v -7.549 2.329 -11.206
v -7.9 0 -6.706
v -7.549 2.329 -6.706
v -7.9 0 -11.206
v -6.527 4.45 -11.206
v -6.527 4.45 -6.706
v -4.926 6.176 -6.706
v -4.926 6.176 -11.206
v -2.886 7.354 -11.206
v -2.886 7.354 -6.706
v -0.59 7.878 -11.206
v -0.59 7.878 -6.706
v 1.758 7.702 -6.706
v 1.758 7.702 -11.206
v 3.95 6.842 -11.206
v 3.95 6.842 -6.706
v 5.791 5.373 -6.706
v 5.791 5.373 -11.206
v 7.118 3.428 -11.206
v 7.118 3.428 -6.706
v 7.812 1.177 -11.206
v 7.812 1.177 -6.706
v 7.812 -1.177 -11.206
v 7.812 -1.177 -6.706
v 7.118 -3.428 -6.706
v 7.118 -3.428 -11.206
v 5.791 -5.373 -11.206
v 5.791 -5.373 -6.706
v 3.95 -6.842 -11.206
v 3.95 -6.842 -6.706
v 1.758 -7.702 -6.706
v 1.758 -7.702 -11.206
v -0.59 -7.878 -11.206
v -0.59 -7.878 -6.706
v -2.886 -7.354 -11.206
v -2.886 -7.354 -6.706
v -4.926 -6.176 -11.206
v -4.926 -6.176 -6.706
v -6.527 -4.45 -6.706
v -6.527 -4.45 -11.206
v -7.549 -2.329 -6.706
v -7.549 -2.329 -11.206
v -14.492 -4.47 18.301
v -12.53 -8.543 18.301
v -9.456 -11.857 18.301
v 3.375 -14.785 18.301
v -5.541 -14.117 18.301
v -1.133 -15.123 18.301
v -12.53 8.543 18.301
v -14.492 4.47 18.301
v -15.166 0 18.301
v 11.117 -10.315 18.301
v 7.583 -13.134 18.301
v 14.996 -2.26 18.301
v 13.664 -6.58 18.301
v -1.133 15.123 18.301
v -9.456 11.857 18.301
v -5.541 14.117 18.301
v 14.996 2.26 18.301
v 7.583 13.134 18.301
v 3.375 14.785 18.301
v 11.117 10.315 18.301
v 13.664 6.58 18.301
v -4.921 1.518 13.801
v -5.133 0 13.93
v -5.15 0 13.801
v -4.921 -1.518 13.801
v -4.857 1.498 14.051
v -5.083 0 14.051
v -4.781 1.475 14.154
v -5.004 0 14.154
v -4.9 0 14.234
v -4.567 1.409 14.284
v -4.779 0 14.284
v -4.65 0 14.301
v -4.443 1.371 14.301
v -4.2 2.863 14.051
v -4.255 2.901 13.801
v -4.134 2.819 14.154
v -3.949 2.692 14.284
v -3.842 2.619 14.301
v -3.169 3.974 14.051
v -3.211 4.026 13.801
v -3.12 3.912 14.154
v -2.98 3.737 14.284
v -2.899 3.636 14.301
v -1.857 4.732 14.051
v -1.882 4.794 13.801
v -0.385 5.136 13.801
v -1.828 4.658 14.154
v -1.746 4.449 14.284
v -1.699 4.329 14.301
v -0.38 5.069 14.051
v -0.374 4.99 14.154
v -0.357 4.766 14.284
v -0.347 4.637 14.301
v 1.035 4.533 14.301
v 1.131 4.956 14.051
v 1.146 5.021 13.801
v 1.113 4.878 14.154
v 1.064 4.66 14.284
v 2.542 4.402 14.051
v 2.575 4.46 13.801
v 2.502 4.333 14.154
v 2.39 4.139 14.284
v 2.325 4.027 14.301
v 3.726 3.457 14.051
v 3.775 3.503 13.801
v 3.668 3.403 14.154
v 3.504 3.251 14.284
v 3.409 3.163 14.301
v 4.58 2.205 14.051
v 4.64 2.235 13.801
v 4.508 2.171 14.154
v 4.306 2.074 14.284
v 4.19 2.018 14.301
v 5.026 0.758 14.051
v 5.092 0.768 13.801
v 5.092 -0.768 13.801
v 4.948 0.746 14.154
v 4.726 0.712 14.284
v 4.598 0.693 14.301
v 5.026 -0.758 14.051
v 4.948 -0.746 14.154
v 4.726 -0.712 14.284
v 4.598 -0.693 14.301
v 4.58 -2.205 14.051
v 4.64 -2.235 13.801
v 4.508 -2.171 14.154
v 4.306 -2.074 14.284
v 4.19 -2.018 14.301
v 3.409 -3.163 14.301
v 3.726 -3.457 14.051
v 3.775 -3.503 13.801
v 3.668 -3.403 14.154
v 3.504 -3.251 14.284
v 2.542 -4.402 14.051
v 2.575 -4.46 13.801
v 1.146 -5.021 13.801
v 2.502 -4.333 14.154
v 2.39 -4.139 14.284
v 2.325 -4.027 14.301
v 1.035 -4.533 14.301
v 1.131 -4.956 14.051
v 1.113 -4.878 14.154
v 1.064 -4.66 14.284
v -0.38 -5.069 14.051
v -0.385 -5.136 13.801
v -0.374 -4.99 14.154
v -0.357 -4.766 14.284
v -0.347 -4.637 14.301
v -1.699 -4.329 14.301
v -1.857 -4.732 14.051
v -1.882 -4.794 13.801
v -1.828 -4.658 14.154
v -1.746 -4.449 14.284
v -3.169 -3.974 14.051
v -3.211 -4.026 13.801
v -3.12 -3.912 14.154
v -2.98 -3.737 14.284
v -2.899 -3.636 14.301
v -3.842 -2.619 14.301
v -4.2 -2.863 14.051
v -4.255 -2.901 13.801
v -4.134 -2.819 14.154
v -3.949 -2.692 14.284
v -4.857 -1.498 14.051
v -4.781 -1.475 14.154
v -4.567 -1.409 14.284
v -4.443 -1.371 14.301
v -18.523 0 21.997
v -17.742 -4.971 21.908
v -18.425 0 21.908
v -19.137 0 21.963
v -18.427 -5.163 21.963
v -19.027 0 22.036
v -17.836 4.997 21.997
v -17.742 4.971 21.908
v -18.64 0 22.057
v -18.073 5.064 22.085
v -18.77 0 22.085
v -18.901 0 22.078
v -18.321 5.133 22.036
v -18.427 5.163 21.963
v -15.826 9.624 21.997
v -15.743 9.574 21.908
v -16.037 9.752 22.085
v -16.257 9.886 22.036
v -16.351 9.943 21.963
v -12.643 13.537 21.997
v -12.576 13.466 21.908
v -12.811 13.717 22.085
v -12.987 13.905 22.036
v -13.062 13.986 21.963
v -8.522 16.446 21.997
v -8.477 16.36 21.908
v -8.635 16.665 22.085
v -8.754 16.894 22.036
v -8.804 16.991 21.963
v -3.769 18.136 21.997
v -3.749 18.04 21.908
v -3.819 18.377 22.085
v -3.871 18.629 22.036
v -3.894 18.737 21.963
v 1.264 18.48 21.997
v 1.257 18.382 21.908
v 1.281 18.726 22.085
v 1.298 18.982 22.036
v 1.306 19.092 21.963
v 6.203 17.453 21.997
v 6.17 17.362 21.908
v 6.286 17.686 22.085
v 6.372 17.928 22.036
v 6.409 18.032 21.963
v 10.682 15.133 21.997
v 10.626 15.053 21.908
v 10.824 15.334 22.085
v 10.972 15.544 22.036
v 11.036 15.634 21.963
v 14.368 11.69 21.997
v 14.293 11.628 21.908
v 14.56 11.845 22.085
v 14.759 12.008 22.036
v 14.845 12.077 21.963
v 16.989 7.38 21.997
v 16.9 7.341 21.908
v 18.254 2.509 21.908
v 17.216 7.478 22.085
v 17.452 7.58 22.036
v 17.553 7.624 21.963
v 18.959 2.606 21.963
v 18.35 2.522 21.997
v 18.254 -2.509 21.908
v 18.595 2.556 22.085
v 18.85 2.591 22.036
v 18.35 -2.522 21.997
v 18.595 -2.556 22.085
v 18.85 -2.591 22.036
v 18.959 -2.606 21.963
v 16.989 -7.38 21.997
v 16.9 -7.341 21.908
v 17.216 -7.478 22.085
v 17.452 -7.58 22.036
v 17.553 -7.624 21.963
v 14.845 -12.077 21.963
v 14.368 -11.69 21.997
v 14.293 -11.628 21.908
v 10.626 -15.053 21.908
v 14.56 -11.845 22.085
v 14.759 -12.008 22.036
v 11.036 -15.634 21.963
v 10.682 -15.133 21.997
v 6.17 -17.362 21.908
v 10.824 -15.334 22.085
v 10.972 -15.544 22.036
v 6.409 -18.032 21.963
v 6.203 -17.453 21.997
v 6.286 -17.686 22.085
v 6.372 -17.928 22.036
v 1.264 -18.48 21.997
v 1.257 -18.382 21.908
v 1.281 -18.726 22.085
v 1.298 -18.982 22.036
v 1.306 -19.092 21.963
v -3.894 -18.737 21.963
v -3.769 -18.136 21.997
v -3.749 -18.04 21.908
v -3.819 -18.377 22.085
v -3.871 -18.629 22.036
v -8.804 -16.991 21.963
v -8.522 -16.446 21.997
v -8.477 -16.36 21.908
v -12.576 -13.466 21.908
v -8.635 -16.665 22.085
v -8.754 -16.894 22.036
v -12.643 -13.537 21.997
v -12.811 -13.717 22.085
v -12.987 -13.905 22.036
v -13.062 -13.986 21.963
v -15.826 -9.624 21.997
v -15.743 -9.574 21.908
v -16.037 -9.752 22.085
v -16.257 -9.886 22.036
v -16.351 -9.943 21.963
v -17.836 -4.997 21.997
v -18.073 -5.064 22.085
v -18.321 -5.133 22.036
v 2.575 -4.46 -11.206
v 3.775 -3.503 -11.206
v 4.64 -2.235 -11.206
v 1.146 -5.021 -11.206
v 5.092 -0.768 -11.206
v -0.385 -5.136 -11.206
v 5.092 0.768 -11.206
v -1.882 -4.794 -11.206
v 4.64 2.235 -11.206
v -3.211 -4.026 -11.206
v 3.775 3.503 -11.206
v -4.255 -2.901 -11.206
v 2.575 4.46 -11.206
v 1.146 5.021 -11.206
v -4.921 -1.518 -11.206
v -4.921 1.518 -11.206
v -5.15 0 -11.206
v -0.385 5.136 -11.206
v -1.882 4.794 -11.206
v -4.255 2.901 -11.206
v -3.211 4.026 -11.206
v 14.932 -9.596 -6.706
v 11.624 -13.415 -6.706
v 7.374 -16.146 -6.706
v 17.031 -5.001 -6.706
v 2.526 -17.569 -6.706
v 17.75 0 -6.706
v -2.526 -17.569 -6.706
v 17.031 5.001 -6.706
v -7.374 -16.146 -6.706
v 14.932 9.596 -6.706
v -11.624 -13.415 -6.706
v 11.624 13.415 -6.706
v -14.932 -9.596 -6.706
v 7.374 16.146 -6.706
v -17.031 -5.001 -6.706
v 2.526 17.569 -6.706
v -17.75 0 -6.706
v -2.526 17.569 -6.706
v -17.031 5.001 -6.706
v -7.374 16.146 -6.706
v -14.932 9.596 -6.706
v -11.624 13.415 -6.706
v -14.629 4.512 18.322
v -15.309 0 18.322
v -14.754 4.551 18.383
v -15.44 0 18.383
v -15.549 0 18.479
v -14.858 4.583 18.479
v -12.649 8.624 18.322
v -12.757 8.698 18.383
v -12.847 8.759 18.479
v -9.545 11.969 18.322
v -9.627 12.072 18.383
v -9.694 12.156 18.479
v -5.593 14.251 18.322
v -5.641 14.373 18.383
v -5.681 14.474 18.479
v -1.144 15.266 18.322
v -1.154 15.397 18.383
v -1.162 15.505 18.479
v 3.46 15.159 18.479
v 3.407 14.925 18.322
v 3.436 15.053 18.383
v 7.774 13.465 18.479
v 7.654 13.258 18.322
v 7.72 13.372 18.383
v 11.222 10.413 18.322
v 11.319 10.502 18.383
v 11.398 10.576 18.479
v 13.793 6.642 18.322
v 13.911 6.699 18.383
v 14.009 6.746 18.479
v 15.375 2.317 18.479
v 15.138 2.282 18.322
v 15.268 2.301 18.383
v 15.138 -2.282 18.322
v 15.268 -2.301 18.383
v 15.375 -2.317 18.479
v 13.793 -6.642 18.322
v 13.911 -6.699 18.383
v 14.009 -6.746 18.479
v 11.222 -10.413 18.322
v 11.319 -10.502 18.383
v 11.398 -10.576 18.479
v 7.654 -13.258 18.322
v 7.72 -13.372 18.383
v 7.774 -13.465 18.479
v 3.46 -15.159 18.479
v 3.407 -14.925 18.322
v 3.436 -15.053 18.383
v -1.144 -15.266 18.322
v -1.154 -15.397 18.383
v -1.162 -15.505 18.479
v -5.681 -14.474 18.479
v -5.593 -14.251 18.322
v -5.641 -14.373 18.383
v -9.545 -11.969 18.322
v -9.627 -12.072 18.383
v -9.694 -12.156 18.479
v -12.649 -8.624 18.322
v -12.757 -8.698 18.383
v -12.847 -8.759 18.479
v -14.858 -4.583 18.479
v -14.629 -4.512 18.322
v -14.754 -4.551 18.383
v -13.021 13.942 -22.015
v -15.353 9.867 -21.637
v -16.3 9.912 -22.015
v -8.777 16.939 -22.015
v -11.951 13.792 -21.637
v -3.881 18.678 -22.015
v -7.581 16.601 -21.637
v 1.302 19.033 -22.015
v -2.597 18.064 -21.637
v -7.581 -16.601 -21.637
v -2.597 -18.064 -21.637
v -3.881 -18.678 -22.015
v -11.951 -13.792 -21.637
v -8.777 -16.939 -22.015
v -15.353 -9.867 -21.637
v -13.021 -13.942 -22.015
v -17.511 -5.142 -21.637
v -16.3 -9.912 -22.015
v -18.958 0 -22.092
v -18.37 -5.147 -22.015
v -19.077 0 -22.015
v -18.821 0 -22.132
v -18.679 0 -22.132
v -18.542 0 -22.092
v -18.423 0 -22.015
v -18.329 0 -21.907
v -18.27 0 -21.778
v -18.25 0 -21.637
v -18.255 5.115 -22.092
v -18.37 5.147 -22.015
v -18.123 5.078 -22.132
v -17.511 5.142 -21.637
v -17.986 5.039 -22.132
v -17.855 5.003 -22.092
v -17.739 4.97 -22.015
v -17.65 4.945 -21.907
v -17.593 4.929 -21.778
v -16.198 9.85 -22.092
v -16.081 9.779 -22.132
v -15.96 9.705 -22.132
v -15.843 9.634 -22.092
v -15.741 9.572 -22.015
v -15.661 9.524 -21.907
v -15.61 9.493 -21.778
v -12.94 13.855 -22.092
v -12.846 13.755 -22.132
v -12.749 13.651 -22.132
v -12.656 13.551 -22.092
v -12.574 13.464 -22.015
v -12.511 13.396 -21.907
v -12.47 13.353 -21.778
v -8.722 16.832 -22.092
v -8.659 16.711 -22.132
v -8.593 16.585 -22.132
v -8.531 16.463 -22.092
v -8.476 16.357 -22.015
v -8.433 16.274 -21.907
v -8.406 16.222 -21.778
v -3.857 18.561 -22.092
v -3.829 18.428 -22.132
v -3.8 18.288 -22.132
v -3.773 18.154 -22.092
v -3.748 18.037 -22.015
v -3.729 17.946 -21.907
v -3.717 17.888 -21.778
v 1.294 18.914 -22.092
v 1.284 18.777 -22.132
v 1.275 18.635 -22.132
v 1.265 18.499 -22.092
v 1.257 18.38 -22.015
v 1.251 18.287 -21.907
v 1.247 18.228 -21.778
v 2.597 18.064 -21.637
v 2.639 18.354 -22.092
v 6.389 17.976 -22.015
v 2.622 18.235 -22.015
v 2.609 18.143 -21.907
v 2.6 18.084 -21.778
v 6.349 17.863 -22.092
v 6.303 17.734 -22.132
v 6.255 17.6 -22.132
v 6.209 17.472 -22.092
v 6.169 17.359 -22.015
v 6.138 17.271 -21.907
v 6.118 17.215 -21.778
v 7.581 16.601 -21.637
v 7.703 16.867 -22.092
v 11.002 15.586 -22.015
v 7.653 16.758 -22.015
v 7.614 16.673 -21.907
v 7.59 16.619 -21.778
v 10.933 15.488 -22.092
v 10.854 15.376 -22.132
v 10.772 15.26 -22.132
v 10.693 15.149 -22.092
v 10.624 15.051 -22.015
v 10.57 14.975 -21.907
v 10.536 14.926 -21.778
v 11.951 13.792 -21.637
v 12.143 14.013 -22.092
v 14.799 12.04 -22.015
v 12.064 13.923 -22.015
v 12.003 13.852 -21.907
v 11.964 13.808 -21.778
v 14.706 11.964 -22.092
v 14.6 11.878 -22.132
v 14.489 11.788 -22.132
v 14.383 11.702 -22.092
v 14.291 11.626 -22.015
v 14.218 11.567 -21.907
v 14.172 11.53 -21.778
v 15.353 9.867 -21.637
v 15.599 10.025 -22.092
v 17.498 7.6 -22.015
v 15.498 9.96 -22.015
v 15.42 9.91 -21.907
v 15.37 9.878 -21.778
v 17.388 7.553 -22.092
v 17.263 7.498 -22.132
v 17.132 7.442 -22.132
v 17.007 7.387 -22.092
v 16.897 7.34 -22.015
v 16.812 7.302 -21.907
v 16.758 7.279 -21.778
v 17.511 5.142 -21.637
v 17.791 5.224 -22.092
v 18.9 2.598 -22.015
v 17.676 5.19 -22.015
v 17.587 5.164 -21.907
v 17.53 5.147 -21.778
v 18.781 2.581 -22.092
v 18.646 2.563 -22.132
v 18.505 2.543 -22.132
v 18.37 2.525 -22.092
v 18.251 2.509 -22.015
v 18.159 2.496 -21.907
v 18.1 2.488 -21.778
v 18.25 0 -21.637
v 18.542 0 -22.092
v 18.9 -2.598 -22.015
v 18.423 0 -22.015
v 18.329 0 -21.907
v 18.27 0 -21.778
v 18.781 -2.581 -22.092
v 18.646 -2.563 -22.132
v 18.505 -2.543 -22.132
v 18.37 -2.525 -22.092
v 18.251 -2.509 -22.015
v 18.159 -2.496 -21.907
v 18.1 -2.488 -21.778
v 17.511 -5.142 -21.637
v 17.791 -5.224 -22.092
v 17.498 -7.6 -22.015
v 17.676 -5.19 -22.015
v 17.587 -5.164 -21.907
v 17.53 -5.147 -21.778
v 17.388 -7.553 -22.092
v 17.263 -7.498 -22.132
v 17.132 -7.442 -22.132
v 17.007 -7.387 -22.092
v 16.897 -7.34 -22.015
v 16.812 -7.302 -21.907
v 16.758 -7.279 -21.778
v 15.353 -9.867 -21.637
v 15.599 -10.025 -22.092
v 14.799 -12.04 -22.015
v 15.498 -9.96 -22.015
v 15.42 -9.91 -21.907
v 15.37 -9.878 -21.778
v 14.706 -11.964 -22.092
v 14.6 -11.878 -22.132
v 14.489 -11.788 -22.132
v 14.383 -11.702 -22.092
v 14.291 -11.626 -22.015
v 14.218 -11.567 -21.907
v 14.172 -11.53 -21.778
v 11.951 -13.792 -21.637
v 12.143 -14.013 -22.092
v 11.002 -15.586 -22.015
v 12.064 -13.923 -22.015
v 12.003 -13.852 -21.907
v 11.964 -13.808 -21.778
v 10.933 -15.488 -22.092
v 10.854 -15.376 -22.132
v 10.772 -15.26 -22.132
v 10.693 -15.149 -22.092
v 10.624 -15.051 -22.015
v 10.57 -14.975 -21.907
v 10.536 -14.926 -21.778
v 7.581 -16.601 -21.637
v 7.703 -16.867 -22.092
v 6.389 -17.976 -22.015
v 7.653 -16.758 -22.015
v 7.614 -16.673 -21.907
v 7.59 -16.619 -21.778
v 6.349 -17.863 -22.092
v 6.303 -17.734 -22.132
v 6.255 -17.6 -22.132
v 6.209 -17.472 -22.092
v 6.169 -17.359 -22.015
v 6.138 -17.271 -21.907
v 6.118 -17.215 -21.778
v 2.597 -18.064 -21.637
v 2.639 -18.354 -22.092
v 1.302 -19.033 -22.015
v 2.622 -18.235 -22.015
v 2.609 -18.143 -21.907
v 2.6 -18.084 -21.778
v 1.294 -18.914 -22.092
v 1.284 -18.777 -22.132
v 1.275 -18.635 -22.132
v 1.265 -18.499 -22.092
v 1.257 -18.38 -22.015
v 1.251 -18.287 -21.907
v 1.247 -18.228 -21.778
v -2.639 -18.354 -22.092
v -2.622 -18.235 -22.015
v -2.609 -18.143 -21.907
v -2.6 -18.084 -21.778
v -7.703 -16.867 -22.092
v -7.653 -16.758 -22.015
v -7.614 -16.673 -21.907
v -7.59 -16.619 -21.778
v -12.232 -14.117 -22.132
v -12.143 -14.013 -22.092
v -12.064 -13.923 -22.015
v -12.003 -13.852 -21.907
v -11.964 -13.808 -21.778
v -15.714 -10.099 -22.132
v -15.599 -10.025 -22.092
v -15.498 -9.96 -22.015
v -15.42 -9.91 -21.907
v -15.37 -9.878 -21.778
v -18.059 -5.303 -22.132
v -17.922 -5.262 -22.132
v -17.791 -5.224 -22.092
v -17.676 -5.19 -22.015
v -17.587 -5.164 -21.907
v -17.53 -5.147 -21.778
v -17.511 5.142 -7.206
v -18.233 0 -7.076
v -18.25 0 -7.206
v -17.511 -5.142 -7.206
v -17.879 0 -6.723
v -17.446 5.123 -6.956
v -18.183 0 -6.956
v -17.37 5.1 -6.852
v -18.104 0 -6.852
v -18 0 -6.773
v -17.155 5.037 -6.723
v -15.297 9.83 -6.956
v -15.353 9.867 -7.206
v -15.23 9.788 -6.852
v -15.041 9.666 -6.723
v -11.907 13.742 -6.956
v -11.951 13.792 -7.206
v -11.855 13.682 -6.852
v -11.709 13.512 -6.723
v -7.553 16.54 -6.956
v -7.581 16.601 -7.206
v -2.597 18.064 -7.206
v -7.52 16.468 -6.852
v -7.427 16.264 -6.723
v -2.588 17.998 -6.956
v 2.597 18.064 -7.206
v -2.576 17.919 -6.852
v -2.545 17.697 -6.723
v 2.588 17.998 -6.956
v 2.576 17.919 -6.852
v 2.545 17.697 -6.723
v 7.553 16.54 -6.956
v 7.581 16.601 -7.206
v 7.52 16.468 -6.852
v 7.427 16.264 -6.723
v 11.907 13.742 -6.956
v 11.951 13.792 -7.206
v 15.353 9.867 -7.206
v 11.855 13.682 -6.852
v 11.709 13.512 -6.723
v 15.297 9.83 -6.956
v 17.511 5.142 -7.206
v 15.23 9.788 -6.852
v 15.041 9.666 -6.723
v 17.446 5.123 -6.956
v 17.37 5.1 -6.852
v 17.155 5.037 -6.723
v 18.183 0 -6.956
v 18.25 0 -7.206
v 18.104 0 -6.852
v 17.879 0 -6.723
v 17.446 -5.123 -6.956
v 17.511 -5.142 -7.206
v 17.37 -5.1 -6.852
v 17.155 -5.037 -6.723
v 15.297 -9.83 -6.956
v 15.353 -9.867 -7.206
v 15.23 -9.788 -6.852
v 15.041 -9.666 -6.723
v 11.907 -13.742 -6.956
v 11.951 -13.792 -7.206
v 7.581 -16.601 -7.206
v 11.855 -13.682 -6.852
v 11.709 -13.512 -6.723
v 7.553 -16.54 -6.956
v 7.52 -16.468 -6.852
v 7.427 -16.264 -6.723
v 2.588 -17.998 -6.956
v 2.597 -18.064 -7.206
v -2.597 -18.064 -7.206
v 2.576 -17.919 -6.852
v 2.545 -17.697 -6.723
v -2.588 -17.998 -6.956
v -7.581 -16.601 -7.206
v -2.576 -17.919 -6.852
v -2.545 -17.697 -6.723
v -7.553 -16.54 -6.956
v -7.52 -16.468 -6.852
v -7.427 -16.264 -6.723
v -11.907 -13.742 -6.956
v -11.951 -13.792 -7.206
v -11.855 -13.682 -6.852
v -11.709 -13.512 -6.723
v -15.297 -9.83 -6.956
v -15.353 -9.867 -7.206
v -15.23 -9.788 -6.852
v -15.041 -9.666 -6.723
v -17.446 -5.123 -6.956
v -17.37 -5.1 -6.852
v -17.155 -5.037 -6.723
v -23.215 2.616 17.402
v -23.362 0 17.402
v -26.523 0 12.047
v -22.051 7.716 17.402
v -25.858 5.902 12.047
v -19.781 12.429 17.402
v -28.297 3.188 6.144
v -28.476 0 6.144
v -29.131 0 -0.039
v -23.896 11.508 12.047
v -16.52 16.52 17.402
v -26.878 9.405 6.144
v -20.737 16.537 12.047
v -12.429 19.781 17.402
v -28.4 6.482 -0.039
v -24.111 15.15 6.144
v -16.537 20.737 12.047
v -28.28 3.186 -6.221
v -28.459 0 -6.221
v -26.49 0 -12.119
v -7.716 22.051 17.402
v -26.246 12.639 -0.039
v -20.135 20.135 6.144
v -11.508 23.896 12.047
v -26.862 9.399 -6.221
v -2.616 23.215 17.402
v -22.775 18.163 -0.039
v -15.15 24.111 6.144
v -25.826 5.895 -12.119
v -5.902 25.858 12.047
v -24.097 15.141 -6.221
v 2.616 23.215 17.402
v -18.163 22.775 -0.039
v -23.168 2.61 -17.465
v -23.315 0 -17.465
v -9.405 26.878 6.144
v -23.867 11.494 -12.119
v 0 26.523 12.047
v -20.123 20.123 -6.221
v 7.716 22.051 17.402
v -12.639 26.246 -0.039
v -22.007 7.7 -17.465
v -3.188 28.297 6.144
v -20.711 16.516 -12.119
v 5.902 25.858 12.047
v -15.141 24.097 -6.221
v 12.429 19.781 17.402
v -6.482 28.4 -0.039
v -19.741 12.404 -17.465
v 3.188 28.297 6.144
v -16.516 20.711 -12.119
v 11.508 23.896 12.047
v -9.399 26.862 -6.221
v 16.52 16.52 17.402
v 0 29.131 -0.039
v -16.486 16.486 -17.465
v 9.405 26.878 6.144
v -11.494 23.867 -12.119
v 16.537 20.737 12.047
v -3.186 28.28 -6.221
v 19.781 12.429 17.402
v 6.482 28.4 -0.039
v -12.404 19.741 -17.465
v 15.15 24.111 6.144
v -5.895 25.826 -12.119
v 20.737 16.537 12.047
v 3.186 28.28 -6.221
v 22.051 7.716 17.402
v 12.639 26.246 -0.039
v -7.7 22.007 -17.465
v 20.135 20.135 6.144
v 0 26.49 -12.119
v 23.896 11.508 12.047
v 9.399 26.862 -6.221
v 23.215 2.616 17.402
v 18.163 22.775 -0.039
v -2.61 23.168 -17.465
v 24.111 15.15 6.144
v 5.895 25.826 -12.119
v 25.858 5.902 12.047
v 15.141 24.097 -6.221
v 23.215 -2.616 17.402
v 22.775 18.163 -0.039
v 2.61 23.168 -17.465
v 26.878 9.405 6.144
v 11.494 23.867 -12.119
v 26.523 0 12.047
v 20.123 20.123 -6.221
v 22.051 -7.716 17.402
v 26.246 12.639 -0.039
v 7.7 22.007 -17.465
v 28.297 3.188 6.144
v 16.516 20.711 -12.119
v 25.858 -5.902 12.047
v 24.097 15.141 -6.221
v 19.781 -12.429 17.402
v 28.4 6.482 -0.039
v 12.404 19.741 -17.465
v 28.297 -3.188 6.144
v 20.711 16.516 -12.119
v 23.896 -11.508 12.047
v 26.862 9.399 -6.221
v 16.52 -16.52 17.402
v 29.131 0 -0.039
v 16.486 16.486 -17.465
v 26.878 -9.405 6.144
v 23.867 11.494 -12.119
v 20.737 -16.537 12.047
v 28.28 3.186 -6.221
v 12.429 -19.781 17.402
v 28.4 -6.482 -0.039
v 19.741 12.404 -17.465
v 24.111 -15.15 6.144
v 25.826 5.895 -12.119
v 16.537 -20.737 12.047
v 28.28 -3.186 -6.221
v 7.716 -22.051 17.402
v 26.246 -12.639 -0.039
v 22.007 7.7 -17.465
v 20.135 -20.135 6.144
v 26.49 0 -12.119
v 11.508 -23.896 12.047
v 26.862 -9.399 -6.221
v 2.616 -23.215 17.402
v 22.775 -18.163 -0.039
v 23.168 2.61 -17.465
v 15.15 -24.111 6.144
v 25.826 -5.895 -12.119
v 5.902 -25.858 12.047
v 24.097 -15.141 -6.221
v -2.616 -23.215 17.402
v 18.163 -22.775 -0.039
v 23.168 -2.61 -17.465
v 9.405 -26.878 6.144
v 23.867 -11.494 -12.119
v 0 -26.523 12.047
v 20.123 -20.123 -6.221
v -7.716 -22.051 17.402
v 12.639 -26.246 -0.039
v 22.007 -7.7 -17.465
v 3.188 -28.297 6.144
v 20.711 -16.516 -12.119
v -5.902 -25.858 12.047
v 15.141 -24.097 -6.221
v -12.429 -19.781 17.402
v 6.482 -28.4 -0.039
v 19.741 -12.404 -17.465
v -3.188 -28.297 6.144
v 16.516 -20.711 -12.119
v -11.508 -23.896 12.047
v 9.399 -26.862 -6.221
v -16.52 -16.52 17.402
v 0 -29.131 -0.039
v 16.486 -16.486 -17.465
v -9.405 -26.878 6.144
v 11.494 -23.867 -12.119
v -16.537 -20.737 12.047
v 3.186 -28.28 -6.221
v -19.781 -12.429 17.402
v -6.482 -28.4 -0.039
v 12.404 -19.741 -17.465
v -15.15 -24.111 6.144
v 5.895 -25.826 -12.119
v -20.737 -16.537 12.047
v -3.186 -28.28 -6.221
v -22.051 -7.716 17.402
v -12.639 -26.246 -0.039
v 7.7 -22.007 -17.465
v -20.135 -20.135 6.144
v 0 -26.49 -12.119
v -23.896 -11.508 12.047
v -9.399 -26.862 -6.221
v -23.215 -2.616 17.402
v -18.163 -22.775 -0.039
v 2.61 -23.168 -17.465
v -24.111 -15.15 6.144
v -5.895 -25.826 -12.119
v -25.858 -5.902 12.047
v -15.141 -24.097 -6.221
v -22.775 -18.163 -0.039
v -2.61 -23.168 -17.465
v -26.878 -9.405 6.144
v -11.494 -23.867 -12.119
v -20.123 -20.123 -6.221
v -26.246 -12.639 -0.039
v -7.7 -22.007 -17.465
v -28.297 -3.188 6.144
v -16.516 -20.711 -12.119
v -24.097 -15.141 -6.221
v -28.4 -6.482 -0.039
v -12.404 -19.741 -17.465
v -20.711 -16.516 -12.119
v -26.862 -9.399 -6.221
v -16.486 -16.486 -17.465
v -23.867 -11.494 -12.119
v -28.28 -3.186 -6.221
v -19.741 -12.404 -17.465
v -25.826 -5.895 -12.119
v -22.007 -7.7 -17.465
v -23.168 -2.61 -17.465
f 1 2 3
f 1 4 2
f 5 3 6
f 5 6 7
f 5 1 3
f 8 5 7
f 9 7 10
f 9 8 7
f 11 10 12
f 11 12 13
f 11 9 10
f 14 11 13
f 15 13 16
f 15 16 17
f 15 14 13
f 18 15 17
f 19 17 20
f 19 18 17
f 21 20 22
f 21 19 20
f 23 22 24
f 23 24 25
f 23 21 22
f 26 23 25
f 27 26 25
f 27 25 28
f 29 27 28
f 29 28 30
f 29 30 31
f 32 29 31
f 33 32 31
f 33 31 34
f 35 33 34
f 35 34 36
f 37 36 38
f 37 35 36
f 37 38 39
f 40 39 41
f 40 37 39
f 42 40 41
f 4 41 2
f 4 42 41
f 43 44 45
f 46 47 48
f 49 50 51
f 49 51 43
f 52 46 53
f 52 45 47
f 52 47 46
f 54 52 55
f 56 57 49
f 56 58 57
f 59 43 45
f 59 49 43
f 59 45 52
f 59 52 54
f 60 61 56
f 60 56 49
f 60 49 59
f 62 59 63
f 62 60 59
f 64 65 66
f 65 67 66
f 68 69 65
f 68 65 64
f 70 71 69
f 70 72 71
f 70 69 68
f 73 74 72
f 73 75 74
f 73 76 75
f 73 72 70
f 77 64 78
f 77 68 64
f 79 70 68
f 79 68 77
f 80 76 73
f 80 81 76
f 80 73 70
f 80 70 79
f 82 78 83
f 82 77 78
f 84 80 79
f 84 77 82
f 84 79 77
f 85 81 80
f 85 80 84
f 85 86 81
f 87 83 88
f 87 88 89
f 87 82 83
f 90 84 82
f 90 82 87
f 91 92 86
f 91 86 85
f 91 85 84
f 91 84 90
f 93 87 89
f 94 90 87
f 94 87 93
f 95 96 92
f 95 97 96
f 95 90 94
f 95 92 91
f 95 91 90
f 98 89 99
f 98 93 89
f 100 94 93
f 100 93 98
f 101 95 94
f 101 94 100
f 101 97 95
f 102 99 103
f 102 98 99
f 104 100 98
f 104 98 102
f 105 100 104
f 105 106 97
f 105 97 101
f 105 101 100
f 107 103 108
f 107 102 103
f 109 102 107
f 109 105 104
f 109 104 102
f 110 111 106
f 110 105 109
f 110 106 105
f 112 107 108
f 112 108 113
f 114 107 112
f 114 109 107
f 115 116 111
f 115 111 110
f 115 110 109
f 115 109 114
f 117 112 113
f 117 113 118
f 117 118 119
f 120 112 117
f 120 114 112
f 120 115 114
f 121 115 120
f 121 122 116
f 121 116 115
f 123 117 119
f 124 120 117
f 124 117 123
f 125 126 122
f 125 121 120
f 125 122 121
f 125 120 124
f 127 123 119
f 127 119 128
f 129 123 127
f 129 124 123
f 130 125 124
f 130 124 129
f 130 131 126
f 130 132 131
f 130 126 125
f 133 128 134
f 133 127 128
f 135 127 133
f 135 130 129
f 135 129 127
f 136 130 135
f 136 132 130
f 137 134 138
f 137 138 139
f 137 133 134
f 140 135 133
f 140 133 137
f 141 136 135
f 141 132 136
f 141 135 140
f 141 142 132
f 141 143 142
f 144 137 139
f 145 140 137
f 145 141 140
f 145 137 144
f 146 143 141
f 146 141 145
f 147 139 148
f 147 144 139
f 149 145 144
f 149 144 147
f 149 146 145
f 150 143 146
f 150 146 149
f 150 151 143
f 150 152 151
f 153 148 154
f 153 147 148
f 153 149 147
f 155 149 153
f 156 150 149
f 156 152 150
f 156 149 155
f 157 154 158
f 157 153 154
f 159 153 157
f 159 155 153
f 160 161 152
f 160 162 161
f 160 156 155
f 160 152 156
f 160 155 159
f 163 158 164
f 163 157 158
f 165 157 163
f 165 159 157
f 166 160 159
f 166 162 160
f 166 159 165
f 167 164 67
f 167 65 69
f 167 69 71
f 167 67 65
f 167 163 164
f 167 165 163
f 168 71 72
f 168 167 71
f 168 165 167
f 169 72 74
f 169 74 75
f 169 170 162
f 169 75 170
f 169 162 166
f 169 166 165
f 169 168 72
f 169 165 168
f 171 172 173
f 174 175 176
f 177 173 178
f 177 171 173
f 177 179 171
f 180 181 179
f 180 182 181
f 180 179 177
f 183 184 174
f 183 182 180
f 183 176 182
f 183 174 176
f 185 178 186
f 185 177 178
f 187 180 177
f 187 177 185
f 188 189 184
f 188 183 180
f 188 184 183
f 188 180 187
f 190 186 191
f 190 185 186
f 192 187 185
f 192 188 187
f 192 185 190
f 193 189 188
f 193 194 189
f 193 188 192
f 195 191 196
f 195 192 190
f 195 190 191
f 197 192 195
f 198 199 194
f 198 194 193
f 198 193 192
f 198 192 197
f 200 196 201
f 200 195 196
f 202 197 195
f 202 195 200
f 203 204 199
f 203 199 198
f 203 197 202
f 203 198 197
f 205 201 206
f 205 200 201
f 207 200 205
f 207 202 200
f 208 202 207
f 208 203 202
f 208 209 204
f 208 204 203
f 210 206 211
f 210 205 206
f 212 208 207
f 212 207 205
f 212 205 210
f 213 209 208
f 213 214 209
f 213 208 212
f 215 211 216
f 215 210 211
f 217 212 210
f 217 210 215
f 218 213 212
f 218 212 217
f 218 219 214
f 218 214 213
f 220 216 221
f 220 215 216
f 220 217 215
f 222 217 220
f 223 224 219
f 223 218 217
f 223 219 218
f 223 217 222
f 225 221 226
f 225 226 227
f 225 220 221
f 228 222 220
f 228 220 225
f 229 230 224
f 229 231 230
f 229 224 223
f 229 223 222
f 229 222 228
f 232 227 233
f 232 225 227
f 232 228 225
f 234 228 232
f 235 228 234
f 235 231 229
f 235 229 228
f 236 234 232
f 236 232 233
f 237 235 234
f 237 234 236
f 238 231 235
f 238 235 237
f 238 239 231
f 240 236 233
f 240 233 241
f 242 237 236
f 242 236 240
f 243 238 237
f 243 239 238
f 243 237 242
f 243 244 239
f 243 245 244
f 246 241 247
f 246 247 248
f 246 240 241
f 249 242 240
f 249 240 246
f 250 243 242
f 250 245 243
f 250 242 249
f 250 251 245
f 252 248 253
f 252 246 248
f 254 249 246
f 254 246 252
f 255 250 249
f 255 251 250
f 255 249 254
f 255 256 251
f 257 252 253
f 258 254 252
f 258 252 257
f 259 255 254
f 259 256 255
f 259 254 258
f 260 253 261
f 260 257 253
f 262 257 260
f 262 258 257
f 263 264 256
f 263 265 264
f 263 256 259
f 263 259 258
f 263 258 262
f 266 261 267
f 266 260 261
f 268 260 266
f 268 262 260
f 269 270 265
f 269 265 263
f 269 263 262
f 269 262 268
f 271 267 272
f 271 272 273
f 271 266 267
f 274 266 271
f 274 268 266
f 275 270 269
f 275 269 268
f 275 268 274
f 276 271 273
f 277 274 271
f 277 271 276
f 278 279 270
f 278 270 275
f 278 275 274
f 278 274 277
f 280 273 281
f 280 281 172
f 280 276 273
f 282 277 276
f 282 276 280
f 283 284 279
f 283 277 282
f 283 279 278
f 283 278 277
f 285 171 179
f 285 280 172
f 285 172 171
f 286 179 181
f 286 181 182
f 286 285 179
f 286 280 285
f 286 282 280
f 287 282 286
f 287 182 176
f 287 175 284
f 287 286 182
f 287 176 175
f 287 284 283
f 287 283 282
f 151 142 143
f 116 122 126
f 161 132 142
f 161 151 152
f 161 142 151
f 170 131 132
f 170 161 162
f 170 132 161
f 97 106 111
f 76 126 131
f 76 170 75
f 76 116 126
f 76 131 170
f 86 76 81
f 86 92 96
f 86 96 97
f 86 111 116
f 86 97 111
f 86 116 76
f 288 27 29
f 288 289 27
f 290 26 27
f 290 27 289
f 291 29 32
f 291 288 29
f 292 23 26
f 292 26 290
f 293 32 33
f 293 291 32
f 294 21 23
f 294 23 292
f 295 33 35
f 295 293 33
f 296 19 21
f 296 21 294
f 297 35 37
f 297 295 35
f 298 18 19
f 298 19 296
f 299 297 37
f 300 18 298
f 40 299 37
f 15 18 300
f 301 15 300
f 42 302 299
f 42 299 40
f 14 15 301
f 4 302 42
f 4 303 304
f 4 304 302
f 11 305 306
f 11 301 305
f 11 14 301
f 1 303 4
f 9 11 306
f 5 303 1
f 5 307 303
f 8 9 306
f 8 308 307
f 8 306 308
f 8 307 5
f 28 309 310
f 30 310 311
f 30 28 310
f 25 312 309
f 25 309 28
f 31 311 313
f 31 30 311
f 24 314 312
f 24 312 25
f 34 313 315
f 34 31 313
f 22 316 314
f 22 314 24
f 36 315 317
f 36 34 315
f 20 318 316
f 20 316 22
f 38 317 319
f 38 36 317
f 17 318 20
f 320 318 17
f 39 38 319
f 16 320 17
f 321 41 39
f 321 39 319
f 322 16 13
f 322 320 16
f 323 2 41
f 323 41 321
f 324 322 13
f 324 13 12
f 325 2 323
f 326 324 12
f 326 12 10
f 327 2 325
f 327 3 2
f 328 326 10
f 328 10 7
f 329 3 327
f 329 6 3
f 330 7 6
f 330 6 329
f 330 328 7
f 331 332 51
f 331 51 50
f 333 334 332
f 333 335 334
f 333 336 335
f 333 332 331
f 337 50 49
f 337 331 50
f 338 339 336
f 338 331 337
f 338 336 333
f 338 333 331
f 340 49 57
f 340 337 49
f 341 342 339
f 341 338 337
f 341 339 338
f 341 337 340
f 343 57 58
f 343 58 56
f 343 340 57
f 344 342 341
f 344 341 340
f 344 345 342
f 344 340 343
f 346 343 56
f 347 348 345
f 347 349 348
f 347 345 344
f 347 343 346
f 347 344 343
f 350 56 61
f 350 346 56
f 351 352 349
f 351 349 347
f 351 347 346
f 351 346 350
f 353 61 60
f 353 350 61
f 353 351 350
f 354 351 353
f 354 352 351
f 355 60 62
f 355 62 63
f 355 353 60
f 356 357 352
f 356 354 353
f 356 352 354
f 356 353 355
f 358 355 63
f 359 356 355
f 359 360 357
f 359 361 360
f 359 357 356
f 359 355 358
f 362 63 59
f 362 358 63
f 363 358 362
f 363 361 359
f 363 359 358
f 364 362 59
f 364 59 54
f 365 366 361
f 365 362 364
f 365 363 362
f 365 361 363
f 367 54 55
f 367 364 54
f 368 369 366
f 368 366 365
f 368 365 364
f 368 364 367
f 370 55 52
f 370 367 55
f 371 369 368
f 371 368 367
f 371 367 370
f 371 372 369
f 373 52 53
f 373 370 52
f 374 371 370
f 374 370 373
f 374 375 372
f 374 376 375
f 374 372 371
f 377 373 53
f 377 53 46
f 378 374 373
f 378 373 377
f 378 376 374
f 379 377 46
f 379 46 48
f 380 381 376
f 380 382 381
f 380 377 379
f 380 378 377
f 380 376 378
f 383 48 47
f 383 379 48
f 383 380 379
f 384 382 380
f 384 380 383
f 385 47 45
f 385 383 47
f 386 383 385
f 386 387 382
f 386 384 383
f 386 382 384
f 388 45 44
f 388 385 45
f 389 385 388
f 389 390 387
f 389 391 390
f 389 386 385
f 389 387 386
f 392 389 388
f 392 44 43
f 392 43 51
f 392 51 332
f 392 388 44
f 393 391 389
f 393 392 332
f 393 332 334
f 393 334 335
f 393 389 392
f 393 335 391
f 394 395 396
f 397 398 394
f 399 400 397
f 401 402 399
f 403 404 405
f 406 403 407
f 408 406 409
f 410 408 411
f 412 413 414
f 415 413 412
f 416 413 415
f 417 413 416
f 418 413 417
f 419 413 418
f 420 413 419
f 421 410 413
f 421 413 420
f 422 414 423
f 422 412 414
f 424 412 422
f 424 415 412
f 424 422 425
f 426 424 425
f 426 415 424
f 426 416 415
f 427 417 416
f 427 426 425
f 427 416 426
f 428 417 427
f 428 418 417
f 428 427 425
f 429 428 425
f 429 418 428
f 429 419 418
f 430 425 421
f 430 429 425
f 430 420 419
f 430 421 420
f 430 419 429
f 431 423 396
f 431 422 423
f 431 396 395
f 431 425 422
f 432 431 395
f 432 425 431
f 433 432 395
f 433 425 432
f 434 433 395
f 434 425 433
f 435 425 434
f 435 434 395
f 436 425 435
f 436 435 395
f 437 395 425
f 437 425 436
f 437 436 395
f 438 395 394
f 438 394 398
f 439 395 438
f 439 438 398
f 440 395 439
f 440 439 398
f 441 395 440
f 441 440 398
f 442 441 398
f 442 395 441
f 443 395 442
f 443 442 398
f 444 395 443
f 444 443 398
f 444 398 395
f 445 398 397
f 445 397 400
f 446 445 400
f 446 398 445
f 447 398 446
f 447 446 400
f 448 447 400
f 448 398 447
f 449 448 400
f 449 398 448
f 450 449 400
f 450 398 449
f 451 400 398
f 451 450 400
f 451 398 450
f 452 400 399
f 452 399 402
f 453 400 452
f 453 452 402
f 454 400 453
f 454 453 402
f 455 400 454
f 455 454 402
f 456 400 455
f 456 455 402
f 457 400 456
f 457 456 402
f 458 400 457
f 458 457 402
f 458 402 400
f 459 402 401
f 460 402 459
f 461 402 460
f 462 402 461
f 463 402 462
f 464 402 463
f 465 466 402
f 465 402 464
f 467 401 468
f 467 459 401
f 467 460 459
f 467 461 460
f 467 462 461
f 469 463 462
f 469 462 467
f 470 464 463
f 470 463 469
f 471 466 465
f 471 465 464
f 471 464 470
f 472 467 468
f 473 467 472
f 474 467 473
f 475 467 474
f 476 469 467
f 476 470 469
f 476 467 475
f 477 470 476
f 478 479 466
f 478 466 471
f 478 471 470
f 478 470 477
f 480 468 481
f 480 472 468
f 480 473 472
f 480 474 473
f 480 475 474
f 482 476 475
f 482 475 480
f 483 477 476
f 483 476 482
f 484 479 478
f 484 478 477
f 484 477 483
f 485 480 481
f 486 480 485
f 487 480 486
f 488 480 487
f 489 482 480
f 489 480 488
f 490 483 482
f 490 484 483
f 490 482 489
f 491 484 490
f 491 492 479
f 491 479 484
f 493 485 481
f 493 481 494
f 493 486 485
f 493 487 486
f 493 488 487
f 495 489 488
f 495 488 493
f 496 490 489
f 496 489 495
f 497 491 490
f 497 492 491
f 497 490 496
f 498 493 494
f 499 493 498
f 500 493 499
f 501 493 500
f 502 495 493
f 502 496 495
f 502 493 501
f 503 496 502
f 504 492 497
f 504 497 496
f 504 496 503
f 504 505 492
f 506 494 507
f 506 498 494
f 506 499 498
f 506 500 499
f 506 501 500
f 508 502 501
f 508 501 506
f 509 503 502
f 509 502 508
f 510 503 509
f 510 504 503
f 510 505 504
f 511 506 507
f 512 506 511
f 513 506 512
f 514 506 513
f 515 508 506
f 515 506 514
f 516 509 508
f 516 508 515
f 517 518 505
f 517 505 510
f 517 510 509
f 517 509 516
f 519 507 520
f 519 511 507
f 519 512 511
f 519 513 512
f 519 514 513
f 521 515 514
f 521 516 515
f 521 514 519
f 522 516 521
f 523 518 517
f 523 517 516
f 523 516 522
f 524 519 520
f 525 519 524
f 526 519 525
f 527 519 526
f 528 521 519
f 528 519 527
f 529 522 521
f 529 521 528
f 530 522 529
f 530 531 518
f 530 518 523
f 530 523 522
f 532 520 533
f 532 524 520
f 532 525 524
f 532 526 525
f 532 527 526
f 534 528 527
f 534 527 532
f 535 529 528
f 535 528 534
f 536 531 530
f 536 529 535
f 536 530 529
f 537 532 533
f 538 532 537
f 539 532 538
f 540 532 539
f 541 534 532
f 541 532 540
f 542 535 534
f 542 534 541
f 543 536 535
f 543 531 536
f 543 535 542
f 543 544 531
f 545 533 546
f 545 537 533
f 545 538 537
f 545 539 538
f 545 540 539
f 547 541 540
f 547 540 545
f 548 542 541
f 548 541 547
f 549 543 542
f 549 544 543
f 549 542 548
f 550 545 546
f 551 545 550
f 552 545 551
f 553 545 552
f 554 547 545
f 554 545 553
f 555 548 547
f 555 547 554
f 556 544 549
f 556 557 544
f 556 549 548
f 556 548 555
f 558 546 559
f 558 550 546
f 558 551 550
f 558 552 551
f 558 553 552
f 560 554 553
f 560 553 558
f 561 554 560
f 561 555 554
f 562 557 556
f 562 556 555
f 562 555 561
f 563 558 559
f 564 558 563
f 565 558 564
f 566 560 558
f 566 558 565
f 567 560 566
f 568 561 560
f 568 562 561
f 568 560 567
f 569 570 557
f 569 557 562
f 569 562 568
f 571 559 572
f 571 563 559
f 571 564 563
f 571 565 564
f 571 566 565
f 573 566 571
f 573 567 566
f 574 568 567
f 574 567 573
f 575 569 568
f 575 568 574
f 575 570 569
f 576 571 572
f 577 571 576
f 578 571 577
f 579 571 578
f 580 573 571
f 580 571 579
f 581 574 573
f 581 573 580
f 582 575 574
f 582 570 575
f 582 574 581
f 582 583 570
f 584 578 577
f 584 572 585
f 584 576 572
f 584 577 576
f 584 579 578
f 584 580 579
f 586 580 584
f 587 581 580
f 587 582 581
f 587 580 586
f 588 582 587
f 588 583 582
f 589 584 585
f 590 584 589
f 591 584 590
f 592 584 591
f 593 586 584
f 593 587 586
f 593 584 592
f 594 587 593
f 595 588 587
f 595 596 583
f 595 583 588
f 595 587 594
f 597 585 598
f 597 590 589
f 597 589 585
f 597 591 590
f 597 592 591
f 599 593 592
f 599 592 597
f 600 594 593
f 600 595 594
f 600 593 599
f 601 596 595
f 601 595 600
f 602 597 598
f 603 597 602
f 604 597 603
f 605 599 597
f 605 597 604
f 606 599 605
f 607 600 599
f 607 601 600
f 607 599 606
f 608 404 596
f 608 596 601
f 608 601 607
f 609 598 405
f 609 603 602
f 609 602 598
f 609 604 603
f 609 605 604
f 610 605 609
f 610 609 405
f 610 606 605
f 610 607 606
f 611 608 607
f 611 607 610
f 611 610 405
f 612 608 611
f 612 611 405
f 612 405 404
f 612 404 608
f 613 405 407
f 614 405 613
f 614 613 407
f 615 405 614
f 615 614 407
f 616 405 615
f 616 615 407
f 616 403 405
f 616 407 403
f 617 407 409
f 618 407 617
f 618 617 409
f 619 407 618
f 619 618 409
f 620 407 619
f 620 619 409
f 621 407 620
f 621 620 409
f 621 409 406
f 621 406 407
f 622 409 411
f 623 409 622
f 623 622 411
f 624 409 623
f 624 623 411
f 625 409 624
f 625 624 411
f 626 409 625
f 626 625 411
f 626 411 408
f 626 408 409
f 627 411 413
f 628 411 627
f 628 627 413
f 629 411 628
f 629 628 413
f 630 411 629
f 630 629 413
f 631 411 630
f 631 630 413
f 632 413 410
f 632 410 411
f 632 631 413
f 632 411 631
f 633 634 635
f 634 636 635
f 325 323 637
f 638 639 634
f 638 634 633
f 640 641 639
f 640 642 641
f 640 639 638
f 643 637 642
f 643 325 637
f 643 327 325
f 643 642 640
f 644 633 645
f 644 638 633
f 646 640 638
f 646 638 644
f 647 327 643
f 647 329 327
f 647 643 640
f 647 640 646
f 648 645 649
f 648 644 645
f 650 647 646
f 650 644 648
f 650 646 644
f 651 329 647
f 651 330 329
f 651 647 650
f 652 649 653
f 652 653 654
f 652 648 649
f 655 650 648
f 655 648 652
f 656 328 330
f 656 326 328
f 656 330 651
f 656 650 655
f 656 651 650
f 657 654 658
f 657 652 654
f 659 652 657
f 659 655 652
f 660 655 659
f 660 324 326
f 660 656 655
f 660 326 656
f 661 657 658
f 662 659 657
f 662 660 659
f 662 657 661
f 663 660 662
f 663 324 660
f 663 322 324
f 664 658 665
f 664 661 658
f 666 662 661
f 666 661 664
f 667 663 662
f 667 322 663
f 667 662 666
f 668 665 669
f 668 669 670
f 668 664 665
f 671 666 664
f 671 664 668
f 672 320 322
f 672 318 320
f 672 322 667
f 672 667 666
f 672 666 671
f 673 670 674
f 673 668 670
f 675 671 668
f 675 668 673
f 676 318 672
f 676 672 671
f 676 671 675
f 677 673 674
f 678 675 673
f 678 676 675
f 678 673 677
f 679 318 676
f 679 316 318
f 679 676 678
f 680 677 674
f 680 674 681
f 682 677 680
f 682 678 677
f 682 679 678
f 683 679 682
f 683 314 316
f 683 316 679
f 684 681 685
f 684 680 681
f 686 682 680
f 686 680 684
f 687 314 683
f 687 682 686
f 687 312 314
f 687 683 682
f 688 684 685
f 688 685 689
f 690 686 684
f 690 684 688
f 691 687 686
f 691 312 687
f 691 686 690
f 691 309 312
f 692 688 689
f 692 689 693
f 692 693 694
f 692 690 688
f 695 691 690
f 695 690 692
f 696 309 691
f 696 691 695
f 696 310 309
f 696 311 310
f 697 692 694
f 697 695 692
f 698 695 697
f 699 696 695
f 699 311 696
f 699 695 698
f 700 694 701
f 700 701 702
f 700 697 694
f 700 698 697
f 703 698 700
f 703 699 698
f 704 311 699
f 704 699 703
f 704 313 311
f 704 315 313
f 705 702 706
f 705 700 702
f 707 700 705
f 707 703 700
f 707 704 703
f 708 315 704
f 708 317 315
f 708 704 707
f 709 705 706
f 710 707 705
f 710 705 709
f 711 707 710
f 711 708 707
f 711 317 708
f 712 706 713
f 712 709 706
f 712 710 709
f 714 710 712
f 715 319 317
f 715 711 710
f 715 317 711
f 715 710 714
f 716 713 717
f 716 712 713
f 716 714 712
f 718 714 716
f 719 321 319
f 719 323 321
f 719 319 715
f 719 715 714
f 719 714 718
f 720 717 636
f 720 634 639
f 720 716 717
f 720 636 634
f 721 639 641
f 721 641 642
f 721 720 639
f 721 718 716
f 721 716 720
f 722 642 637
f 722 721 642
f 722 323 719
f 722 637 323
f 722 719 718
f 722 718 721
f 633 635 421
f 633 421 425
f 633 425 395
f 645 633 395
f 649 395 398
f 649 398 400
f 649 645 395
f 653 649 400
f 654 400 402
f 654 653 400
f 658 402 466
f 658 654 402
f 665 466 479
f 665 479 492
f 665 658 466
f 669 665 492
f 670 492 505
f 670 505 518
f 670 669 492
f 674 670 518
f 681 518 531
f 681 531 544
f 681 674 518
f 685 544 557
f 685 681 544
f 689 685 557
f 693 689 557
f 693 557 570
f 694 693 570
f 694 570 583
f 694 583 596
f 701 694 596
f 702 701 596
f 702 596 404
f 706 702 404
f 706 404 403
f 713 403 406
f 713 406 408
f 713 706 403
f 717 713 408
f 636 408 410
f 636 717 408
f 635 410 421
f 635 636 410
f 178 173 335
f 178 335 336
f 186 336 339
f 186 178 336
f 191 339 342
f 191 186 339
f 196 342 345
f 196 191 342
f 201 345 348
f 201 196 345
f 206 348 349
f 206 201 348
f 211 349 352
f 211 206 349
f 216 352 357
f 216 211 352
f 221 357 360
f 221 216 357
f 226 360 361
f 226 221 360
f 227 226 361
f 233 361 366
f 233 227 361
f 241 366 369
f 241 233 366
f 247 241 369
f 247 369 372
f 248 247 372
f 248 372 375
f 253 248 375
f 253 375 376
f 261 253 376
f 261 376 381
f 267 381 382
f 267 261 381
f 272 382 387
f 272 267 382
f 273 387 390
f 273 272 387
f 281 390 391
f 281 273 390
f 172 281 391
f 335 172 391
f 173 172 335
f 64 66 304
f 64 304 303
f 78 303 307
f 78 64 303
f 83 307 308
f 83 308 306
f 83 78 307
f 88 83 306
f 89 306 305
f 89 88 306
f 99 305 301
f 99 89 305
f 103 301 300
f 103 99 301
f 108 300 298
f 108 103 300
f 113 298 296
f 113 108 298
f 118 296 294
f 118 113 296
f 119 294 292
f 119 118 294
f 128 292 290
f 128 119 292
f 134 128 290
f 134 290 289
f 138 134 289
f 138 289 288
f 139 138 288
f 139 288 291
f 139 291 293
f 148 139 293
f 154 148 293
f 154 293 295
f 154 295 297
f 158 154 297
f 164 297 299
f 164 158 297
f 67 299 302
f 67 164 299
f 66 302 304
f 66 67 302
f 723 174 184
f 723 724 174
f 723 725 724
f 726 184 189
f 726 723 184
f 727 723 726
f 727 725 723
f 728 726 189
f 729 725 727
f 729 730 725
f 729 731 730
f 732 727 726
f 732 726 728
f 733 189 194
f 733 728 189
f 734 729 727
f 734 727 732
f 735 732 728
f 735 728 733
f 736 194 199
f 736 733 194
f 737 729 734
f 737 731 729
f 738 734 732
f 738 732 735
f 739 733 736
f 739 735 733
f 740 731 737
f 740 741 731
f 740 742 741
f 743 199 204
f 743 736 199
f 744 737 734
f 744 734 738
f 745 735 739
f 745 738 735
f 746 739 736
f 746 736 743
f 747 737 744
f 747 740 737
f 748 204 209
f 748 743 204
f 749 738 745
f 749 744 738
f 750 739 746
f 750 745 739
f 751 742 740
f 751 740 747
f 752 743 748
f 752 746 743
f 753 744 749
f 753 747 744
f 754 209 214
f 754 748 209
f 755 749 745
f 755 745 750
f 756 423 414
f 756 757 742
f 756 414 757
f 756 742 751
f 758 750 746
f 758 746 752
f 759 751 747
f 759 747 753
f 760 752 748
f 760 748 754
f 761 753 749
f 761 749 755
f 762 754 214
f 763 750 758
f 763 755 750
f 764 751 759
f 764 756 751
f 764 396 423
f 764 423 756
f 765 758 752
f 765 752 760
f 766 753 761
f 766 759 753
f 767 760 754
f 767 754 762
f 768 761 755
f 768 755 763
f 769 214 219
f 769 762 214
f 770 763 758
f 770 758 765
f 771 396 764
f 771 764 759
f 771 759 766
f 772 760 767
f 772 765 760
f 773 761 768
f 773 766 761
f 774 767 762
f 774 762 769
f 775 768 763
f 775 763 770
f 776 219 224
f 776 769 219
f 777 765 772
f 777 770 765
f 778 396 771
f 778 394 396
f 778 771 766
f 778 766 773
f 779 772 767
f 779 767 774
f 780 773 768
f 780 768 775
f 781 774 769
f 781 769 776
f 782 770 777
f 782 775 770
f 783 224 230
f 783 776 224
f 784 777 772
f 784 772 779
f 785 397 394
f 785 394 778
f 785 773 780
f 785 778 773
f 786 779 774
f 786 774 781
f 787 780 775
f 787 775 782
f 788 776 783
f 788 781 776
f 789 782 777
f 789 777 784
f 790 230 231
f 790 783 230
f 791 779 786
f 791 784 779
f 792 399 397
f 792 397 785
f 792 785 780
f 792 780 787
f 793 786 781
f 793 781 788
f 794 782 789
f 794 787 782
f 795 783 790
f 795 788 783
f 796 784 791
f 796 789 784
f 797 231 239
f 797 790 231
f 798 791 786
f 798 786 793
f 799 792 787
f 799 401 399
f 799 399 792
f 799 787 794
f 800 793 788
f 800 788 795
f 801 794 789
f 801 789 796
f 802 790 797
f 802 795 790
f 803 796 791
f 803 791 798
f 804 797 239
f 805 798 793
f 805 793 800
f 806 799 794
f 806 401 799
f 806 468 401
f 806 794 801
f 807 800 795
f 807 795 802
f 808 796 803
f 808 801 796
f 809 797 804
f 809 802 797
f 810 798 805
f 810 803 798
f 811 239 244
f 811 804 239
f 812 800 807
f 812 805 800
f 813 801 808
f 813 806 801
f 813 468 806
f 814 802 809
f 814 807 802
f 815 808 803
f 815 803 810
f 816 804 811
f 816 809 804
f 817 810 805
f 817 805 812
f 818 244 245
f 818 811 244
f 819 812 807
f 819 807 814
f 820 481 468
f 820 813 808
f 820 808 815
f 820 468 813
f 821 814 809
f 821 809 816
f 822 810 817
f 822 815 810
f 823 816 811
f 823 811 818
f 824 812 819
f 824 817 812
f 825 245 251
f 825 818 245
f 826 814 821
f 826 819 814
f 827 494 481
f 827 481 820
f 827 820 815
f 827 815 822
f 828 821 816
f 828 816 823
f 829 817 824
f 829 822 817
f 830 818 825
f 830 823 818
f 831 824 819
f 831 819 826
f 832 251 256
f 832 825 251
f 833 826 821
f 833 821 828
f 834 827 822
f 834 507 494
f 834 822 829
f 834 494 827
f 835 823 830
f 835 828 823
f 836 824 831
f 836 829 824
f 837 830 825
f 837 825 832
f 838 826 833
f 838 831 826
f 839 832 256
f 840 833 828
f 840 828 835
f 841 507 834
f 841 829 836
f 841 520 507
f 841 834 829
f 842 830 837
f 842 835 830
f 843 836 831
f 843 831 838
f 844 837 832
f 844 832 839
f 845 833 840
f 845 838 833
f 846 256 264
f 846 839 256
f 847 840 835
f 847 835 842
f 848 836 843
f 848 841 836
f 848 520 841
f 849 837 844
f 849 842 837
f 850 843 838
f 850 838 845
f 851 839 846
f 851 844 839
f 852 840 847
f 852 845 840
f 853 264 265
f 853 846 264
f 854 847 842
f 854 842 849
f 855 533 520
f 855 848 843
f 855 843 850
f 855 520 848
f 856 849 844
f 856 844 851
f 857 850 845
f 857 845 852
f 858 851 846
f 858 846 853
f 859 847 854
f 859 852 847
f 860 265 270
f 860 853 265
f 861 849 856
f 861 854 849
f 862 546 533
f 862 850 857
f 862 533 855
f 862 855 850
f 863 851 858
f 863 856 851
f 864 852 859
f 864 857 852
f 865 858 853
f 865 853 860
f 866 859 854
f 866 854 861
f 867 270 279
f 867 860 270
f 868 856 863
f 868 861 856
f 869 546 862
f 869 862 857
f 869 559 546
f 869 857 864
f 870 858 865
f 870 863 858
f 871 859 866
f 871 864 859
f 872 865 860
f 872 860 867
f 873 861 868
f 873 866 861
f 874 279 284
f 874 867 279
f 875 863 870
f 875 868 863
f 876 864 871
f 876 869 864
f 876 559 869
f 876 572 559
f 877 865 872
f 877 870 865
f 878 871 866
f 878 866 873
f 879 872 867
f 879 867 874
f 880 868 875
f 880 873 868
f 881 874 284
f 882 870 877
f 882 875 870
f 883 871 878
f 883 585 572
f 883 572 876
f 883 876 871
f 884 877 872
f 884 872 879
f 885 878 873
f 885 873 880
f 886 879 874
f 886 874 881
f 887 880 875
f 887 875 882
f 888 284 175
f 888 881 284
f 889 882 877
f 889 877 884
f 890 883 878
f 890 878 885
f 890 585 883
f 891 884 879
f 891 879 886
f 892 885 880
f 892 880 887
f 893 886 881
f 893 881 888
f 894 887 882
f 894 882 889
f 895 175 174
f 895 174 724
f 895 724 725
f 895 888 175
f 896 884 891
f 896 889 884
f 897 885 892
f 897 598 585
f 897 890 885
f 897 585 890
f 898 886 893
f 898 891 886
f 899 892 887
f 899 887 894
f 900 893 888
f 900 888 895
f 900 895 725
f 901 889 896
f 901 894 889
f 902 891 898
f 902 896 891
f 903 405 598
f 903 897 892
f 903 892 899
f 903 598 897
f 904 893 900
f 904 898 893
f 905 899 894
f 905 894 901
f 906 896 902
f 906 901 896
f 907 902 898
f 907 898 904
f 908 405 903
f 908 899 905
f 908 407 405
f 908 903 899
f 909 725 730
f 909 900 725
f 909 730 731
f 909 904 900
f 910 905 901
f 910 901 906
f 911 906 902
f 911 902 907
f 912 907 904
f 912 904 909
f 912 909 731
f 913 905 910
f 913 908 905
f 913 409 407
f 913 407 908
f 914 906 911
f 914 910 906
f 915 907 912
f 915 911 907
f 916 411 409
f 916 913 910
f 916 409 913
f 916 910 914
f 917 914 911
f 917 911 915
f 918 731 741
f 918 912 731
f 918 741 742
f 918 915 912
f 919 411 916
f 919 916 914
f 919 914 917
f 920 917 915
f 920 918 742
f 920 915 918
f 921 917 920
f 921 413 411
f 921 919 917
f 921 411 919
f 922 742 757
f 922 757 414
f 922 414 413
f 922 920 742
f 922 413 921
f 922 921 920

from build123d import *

# Parameters (mm, degrees)
F2_R = 0.5


with BuildPart() as f1:
    # F0 (on Front) → F1 (revolve)
    with BuildSketch(Plane.XZ):
        with BuildLine():
            ThreePointArc((-18.4254318222, 21.9076391525), (-18.7695123684, 22.084726587), (-19.1369191934, 21.963221004))
            ThreePointArc((-19.1369191934, 21.963221004), (-29.1307947208, -0.0393957284), (-19.0774443259, -22.0149011144))
            ThreePointArc((-19.0774443259, -22.0149011144), (-18.5423008943, -22.0918582573), (-18.25, -21.6370384232))
            Line((-18.25, -21.6370384232), (-18.25, -6.7055555556))
            Line((-18.25, -6.7055555556), (-7.9, -6.7055555556))
            Line((-7.9, -6.7055555556), (-7.9, -11.2055555556))
            Line((-7.9, -11.2055555556), (-5.15, -11.2055555556))
            Line((-5.15, -11.2055555556), (-5.15, -6.7055555556))
            Line((-5.15, -6.7055555556), (-5.15, 14.3005384632))
            Line((-5.15, 14.3005384632), (0, 14.3005384632))
            Line((0, 14.3005384632), (0, 18.3005384632))
            Line((0, 18.3005384632), (-15.3987149642, 18.3005384632))
            Line((-15.3987149642, 18.3005384632), (-18.4254318222, 21.9076391525))
        make_face()
    revolve(axis=Axis((0, 0, 1.3541673665), (0, 0, -1)))

    # F2
    f2_edges = [f1.edges().sort_by_distance(p)[0] for p in [
        (15.398715, 0, 18.300538),
        (18.25, 0, -6.705556),
        (5.15, 0, 14.300538),
    ]]
    fillet(f2_edges, radius=F2_R)


solid = f1.part
